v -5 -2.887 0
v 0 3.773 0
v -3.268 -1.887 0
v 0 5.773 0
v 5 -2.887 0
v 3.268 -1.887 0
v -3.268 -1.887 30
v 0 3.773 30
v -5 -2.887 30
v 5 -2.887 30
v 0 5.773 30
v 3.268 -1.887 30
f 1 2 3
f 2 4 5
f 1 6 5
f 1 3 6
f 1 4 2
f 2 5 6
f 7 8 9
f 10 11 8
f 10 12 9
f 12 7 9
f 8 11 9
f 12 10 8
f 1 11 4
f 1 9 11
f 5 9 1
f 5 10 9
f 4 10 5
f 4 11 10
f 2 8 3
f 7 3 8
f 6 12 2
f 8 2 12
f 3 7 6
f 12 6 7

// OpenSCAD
// variables
side_length = 10; // [10:400]
height = 30; // [1:400]
wallthickness = 1; // [1:30]
// calculations
scale = (side_length*(sqrt(3)/2)-(3*wallthickness))/(side_length*(sqrt(3)/2));
// model
linear_extrude(height=height) difference(){
polygon(points=[[-side_length/2,-tan(30)*side_length/2],[side_length/2,-tan(30)*side_length/2],[0,side_length/2/cos(30)]]);
scale([scale,scale,0]) polygon(points=[[-side_length/2,-tan(30)*side_length/2],[side_length/2,-tan(30)*side_length/2],[0,side_length/2/cos(30)]]);
}
